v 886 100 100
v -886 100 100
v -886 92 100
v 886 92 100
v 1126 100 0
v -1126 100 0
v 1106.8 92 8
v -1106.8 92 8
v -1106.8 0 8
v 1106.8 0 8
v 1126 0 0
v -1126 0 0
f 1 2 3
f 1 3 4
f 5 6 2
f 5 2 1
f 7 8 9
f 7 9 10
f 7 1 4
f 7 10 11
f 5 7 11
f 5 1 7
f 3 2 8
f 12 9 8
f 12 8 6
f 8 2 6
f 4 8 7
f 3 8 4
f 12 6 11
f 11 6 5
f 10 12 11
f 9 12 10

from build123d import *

# Parameters (mm, degrees)
SKETCH_1_W          = 2252
SKETCH_1_H          = 100
EXTRUDE_1_DEPTH     = 8
SKETCH_2_W          = 2252
SKETCH_2_H          = 8
EXTRUDE_2_DEPTH     = 92
CUT_EXTRUDE_3_DEPTH = 1135.846245092


with BuildPart() as part:
    # 草图1 → 凸台-拉伸1 (new body)
    with BuildSketch(Plane.XY):
        with Locations((0, 50)):
            Rectangle(SKETCH_1_W, SKETCH_1_H)
    extrude(amount=EXTRUDE_1_DEPTH)

    # 草图2 → 凸台-拉伸2 (add)
    with BuildSketch(Plane.XY.offset(8)):
        with Locations((0, 96)):
            Rectangle(SKETCH_2_W, SKETCH_2_H)
    extrude(amount=EXTRUDE_2_DEPTH)

    # 草图3 → 切除-拉伸3 (cut, through all)
    with BuildSketch(Plane(origin=(0, 100, 0), x_dir=(1, 0, 0), z_dir=(0, 1, 0))):
        Polygon((886, -100), (1126, 0), (1126, -100), align=None)
    cut_extrude_3 = extrude(amount=-CUT_EXTRUDE_3_DEPTH, mode=Mode.SUBTRACT)

    # 镜向8: 切除-拉伸3 across plane
    add(cut_extrude_3.mirror(Plane(origin=(0, 0, 0), x_dir=(0, 0, 1), z_dir=(1, 0, 0))), mode=Mode.SUBTRACT)


solid = part.part
